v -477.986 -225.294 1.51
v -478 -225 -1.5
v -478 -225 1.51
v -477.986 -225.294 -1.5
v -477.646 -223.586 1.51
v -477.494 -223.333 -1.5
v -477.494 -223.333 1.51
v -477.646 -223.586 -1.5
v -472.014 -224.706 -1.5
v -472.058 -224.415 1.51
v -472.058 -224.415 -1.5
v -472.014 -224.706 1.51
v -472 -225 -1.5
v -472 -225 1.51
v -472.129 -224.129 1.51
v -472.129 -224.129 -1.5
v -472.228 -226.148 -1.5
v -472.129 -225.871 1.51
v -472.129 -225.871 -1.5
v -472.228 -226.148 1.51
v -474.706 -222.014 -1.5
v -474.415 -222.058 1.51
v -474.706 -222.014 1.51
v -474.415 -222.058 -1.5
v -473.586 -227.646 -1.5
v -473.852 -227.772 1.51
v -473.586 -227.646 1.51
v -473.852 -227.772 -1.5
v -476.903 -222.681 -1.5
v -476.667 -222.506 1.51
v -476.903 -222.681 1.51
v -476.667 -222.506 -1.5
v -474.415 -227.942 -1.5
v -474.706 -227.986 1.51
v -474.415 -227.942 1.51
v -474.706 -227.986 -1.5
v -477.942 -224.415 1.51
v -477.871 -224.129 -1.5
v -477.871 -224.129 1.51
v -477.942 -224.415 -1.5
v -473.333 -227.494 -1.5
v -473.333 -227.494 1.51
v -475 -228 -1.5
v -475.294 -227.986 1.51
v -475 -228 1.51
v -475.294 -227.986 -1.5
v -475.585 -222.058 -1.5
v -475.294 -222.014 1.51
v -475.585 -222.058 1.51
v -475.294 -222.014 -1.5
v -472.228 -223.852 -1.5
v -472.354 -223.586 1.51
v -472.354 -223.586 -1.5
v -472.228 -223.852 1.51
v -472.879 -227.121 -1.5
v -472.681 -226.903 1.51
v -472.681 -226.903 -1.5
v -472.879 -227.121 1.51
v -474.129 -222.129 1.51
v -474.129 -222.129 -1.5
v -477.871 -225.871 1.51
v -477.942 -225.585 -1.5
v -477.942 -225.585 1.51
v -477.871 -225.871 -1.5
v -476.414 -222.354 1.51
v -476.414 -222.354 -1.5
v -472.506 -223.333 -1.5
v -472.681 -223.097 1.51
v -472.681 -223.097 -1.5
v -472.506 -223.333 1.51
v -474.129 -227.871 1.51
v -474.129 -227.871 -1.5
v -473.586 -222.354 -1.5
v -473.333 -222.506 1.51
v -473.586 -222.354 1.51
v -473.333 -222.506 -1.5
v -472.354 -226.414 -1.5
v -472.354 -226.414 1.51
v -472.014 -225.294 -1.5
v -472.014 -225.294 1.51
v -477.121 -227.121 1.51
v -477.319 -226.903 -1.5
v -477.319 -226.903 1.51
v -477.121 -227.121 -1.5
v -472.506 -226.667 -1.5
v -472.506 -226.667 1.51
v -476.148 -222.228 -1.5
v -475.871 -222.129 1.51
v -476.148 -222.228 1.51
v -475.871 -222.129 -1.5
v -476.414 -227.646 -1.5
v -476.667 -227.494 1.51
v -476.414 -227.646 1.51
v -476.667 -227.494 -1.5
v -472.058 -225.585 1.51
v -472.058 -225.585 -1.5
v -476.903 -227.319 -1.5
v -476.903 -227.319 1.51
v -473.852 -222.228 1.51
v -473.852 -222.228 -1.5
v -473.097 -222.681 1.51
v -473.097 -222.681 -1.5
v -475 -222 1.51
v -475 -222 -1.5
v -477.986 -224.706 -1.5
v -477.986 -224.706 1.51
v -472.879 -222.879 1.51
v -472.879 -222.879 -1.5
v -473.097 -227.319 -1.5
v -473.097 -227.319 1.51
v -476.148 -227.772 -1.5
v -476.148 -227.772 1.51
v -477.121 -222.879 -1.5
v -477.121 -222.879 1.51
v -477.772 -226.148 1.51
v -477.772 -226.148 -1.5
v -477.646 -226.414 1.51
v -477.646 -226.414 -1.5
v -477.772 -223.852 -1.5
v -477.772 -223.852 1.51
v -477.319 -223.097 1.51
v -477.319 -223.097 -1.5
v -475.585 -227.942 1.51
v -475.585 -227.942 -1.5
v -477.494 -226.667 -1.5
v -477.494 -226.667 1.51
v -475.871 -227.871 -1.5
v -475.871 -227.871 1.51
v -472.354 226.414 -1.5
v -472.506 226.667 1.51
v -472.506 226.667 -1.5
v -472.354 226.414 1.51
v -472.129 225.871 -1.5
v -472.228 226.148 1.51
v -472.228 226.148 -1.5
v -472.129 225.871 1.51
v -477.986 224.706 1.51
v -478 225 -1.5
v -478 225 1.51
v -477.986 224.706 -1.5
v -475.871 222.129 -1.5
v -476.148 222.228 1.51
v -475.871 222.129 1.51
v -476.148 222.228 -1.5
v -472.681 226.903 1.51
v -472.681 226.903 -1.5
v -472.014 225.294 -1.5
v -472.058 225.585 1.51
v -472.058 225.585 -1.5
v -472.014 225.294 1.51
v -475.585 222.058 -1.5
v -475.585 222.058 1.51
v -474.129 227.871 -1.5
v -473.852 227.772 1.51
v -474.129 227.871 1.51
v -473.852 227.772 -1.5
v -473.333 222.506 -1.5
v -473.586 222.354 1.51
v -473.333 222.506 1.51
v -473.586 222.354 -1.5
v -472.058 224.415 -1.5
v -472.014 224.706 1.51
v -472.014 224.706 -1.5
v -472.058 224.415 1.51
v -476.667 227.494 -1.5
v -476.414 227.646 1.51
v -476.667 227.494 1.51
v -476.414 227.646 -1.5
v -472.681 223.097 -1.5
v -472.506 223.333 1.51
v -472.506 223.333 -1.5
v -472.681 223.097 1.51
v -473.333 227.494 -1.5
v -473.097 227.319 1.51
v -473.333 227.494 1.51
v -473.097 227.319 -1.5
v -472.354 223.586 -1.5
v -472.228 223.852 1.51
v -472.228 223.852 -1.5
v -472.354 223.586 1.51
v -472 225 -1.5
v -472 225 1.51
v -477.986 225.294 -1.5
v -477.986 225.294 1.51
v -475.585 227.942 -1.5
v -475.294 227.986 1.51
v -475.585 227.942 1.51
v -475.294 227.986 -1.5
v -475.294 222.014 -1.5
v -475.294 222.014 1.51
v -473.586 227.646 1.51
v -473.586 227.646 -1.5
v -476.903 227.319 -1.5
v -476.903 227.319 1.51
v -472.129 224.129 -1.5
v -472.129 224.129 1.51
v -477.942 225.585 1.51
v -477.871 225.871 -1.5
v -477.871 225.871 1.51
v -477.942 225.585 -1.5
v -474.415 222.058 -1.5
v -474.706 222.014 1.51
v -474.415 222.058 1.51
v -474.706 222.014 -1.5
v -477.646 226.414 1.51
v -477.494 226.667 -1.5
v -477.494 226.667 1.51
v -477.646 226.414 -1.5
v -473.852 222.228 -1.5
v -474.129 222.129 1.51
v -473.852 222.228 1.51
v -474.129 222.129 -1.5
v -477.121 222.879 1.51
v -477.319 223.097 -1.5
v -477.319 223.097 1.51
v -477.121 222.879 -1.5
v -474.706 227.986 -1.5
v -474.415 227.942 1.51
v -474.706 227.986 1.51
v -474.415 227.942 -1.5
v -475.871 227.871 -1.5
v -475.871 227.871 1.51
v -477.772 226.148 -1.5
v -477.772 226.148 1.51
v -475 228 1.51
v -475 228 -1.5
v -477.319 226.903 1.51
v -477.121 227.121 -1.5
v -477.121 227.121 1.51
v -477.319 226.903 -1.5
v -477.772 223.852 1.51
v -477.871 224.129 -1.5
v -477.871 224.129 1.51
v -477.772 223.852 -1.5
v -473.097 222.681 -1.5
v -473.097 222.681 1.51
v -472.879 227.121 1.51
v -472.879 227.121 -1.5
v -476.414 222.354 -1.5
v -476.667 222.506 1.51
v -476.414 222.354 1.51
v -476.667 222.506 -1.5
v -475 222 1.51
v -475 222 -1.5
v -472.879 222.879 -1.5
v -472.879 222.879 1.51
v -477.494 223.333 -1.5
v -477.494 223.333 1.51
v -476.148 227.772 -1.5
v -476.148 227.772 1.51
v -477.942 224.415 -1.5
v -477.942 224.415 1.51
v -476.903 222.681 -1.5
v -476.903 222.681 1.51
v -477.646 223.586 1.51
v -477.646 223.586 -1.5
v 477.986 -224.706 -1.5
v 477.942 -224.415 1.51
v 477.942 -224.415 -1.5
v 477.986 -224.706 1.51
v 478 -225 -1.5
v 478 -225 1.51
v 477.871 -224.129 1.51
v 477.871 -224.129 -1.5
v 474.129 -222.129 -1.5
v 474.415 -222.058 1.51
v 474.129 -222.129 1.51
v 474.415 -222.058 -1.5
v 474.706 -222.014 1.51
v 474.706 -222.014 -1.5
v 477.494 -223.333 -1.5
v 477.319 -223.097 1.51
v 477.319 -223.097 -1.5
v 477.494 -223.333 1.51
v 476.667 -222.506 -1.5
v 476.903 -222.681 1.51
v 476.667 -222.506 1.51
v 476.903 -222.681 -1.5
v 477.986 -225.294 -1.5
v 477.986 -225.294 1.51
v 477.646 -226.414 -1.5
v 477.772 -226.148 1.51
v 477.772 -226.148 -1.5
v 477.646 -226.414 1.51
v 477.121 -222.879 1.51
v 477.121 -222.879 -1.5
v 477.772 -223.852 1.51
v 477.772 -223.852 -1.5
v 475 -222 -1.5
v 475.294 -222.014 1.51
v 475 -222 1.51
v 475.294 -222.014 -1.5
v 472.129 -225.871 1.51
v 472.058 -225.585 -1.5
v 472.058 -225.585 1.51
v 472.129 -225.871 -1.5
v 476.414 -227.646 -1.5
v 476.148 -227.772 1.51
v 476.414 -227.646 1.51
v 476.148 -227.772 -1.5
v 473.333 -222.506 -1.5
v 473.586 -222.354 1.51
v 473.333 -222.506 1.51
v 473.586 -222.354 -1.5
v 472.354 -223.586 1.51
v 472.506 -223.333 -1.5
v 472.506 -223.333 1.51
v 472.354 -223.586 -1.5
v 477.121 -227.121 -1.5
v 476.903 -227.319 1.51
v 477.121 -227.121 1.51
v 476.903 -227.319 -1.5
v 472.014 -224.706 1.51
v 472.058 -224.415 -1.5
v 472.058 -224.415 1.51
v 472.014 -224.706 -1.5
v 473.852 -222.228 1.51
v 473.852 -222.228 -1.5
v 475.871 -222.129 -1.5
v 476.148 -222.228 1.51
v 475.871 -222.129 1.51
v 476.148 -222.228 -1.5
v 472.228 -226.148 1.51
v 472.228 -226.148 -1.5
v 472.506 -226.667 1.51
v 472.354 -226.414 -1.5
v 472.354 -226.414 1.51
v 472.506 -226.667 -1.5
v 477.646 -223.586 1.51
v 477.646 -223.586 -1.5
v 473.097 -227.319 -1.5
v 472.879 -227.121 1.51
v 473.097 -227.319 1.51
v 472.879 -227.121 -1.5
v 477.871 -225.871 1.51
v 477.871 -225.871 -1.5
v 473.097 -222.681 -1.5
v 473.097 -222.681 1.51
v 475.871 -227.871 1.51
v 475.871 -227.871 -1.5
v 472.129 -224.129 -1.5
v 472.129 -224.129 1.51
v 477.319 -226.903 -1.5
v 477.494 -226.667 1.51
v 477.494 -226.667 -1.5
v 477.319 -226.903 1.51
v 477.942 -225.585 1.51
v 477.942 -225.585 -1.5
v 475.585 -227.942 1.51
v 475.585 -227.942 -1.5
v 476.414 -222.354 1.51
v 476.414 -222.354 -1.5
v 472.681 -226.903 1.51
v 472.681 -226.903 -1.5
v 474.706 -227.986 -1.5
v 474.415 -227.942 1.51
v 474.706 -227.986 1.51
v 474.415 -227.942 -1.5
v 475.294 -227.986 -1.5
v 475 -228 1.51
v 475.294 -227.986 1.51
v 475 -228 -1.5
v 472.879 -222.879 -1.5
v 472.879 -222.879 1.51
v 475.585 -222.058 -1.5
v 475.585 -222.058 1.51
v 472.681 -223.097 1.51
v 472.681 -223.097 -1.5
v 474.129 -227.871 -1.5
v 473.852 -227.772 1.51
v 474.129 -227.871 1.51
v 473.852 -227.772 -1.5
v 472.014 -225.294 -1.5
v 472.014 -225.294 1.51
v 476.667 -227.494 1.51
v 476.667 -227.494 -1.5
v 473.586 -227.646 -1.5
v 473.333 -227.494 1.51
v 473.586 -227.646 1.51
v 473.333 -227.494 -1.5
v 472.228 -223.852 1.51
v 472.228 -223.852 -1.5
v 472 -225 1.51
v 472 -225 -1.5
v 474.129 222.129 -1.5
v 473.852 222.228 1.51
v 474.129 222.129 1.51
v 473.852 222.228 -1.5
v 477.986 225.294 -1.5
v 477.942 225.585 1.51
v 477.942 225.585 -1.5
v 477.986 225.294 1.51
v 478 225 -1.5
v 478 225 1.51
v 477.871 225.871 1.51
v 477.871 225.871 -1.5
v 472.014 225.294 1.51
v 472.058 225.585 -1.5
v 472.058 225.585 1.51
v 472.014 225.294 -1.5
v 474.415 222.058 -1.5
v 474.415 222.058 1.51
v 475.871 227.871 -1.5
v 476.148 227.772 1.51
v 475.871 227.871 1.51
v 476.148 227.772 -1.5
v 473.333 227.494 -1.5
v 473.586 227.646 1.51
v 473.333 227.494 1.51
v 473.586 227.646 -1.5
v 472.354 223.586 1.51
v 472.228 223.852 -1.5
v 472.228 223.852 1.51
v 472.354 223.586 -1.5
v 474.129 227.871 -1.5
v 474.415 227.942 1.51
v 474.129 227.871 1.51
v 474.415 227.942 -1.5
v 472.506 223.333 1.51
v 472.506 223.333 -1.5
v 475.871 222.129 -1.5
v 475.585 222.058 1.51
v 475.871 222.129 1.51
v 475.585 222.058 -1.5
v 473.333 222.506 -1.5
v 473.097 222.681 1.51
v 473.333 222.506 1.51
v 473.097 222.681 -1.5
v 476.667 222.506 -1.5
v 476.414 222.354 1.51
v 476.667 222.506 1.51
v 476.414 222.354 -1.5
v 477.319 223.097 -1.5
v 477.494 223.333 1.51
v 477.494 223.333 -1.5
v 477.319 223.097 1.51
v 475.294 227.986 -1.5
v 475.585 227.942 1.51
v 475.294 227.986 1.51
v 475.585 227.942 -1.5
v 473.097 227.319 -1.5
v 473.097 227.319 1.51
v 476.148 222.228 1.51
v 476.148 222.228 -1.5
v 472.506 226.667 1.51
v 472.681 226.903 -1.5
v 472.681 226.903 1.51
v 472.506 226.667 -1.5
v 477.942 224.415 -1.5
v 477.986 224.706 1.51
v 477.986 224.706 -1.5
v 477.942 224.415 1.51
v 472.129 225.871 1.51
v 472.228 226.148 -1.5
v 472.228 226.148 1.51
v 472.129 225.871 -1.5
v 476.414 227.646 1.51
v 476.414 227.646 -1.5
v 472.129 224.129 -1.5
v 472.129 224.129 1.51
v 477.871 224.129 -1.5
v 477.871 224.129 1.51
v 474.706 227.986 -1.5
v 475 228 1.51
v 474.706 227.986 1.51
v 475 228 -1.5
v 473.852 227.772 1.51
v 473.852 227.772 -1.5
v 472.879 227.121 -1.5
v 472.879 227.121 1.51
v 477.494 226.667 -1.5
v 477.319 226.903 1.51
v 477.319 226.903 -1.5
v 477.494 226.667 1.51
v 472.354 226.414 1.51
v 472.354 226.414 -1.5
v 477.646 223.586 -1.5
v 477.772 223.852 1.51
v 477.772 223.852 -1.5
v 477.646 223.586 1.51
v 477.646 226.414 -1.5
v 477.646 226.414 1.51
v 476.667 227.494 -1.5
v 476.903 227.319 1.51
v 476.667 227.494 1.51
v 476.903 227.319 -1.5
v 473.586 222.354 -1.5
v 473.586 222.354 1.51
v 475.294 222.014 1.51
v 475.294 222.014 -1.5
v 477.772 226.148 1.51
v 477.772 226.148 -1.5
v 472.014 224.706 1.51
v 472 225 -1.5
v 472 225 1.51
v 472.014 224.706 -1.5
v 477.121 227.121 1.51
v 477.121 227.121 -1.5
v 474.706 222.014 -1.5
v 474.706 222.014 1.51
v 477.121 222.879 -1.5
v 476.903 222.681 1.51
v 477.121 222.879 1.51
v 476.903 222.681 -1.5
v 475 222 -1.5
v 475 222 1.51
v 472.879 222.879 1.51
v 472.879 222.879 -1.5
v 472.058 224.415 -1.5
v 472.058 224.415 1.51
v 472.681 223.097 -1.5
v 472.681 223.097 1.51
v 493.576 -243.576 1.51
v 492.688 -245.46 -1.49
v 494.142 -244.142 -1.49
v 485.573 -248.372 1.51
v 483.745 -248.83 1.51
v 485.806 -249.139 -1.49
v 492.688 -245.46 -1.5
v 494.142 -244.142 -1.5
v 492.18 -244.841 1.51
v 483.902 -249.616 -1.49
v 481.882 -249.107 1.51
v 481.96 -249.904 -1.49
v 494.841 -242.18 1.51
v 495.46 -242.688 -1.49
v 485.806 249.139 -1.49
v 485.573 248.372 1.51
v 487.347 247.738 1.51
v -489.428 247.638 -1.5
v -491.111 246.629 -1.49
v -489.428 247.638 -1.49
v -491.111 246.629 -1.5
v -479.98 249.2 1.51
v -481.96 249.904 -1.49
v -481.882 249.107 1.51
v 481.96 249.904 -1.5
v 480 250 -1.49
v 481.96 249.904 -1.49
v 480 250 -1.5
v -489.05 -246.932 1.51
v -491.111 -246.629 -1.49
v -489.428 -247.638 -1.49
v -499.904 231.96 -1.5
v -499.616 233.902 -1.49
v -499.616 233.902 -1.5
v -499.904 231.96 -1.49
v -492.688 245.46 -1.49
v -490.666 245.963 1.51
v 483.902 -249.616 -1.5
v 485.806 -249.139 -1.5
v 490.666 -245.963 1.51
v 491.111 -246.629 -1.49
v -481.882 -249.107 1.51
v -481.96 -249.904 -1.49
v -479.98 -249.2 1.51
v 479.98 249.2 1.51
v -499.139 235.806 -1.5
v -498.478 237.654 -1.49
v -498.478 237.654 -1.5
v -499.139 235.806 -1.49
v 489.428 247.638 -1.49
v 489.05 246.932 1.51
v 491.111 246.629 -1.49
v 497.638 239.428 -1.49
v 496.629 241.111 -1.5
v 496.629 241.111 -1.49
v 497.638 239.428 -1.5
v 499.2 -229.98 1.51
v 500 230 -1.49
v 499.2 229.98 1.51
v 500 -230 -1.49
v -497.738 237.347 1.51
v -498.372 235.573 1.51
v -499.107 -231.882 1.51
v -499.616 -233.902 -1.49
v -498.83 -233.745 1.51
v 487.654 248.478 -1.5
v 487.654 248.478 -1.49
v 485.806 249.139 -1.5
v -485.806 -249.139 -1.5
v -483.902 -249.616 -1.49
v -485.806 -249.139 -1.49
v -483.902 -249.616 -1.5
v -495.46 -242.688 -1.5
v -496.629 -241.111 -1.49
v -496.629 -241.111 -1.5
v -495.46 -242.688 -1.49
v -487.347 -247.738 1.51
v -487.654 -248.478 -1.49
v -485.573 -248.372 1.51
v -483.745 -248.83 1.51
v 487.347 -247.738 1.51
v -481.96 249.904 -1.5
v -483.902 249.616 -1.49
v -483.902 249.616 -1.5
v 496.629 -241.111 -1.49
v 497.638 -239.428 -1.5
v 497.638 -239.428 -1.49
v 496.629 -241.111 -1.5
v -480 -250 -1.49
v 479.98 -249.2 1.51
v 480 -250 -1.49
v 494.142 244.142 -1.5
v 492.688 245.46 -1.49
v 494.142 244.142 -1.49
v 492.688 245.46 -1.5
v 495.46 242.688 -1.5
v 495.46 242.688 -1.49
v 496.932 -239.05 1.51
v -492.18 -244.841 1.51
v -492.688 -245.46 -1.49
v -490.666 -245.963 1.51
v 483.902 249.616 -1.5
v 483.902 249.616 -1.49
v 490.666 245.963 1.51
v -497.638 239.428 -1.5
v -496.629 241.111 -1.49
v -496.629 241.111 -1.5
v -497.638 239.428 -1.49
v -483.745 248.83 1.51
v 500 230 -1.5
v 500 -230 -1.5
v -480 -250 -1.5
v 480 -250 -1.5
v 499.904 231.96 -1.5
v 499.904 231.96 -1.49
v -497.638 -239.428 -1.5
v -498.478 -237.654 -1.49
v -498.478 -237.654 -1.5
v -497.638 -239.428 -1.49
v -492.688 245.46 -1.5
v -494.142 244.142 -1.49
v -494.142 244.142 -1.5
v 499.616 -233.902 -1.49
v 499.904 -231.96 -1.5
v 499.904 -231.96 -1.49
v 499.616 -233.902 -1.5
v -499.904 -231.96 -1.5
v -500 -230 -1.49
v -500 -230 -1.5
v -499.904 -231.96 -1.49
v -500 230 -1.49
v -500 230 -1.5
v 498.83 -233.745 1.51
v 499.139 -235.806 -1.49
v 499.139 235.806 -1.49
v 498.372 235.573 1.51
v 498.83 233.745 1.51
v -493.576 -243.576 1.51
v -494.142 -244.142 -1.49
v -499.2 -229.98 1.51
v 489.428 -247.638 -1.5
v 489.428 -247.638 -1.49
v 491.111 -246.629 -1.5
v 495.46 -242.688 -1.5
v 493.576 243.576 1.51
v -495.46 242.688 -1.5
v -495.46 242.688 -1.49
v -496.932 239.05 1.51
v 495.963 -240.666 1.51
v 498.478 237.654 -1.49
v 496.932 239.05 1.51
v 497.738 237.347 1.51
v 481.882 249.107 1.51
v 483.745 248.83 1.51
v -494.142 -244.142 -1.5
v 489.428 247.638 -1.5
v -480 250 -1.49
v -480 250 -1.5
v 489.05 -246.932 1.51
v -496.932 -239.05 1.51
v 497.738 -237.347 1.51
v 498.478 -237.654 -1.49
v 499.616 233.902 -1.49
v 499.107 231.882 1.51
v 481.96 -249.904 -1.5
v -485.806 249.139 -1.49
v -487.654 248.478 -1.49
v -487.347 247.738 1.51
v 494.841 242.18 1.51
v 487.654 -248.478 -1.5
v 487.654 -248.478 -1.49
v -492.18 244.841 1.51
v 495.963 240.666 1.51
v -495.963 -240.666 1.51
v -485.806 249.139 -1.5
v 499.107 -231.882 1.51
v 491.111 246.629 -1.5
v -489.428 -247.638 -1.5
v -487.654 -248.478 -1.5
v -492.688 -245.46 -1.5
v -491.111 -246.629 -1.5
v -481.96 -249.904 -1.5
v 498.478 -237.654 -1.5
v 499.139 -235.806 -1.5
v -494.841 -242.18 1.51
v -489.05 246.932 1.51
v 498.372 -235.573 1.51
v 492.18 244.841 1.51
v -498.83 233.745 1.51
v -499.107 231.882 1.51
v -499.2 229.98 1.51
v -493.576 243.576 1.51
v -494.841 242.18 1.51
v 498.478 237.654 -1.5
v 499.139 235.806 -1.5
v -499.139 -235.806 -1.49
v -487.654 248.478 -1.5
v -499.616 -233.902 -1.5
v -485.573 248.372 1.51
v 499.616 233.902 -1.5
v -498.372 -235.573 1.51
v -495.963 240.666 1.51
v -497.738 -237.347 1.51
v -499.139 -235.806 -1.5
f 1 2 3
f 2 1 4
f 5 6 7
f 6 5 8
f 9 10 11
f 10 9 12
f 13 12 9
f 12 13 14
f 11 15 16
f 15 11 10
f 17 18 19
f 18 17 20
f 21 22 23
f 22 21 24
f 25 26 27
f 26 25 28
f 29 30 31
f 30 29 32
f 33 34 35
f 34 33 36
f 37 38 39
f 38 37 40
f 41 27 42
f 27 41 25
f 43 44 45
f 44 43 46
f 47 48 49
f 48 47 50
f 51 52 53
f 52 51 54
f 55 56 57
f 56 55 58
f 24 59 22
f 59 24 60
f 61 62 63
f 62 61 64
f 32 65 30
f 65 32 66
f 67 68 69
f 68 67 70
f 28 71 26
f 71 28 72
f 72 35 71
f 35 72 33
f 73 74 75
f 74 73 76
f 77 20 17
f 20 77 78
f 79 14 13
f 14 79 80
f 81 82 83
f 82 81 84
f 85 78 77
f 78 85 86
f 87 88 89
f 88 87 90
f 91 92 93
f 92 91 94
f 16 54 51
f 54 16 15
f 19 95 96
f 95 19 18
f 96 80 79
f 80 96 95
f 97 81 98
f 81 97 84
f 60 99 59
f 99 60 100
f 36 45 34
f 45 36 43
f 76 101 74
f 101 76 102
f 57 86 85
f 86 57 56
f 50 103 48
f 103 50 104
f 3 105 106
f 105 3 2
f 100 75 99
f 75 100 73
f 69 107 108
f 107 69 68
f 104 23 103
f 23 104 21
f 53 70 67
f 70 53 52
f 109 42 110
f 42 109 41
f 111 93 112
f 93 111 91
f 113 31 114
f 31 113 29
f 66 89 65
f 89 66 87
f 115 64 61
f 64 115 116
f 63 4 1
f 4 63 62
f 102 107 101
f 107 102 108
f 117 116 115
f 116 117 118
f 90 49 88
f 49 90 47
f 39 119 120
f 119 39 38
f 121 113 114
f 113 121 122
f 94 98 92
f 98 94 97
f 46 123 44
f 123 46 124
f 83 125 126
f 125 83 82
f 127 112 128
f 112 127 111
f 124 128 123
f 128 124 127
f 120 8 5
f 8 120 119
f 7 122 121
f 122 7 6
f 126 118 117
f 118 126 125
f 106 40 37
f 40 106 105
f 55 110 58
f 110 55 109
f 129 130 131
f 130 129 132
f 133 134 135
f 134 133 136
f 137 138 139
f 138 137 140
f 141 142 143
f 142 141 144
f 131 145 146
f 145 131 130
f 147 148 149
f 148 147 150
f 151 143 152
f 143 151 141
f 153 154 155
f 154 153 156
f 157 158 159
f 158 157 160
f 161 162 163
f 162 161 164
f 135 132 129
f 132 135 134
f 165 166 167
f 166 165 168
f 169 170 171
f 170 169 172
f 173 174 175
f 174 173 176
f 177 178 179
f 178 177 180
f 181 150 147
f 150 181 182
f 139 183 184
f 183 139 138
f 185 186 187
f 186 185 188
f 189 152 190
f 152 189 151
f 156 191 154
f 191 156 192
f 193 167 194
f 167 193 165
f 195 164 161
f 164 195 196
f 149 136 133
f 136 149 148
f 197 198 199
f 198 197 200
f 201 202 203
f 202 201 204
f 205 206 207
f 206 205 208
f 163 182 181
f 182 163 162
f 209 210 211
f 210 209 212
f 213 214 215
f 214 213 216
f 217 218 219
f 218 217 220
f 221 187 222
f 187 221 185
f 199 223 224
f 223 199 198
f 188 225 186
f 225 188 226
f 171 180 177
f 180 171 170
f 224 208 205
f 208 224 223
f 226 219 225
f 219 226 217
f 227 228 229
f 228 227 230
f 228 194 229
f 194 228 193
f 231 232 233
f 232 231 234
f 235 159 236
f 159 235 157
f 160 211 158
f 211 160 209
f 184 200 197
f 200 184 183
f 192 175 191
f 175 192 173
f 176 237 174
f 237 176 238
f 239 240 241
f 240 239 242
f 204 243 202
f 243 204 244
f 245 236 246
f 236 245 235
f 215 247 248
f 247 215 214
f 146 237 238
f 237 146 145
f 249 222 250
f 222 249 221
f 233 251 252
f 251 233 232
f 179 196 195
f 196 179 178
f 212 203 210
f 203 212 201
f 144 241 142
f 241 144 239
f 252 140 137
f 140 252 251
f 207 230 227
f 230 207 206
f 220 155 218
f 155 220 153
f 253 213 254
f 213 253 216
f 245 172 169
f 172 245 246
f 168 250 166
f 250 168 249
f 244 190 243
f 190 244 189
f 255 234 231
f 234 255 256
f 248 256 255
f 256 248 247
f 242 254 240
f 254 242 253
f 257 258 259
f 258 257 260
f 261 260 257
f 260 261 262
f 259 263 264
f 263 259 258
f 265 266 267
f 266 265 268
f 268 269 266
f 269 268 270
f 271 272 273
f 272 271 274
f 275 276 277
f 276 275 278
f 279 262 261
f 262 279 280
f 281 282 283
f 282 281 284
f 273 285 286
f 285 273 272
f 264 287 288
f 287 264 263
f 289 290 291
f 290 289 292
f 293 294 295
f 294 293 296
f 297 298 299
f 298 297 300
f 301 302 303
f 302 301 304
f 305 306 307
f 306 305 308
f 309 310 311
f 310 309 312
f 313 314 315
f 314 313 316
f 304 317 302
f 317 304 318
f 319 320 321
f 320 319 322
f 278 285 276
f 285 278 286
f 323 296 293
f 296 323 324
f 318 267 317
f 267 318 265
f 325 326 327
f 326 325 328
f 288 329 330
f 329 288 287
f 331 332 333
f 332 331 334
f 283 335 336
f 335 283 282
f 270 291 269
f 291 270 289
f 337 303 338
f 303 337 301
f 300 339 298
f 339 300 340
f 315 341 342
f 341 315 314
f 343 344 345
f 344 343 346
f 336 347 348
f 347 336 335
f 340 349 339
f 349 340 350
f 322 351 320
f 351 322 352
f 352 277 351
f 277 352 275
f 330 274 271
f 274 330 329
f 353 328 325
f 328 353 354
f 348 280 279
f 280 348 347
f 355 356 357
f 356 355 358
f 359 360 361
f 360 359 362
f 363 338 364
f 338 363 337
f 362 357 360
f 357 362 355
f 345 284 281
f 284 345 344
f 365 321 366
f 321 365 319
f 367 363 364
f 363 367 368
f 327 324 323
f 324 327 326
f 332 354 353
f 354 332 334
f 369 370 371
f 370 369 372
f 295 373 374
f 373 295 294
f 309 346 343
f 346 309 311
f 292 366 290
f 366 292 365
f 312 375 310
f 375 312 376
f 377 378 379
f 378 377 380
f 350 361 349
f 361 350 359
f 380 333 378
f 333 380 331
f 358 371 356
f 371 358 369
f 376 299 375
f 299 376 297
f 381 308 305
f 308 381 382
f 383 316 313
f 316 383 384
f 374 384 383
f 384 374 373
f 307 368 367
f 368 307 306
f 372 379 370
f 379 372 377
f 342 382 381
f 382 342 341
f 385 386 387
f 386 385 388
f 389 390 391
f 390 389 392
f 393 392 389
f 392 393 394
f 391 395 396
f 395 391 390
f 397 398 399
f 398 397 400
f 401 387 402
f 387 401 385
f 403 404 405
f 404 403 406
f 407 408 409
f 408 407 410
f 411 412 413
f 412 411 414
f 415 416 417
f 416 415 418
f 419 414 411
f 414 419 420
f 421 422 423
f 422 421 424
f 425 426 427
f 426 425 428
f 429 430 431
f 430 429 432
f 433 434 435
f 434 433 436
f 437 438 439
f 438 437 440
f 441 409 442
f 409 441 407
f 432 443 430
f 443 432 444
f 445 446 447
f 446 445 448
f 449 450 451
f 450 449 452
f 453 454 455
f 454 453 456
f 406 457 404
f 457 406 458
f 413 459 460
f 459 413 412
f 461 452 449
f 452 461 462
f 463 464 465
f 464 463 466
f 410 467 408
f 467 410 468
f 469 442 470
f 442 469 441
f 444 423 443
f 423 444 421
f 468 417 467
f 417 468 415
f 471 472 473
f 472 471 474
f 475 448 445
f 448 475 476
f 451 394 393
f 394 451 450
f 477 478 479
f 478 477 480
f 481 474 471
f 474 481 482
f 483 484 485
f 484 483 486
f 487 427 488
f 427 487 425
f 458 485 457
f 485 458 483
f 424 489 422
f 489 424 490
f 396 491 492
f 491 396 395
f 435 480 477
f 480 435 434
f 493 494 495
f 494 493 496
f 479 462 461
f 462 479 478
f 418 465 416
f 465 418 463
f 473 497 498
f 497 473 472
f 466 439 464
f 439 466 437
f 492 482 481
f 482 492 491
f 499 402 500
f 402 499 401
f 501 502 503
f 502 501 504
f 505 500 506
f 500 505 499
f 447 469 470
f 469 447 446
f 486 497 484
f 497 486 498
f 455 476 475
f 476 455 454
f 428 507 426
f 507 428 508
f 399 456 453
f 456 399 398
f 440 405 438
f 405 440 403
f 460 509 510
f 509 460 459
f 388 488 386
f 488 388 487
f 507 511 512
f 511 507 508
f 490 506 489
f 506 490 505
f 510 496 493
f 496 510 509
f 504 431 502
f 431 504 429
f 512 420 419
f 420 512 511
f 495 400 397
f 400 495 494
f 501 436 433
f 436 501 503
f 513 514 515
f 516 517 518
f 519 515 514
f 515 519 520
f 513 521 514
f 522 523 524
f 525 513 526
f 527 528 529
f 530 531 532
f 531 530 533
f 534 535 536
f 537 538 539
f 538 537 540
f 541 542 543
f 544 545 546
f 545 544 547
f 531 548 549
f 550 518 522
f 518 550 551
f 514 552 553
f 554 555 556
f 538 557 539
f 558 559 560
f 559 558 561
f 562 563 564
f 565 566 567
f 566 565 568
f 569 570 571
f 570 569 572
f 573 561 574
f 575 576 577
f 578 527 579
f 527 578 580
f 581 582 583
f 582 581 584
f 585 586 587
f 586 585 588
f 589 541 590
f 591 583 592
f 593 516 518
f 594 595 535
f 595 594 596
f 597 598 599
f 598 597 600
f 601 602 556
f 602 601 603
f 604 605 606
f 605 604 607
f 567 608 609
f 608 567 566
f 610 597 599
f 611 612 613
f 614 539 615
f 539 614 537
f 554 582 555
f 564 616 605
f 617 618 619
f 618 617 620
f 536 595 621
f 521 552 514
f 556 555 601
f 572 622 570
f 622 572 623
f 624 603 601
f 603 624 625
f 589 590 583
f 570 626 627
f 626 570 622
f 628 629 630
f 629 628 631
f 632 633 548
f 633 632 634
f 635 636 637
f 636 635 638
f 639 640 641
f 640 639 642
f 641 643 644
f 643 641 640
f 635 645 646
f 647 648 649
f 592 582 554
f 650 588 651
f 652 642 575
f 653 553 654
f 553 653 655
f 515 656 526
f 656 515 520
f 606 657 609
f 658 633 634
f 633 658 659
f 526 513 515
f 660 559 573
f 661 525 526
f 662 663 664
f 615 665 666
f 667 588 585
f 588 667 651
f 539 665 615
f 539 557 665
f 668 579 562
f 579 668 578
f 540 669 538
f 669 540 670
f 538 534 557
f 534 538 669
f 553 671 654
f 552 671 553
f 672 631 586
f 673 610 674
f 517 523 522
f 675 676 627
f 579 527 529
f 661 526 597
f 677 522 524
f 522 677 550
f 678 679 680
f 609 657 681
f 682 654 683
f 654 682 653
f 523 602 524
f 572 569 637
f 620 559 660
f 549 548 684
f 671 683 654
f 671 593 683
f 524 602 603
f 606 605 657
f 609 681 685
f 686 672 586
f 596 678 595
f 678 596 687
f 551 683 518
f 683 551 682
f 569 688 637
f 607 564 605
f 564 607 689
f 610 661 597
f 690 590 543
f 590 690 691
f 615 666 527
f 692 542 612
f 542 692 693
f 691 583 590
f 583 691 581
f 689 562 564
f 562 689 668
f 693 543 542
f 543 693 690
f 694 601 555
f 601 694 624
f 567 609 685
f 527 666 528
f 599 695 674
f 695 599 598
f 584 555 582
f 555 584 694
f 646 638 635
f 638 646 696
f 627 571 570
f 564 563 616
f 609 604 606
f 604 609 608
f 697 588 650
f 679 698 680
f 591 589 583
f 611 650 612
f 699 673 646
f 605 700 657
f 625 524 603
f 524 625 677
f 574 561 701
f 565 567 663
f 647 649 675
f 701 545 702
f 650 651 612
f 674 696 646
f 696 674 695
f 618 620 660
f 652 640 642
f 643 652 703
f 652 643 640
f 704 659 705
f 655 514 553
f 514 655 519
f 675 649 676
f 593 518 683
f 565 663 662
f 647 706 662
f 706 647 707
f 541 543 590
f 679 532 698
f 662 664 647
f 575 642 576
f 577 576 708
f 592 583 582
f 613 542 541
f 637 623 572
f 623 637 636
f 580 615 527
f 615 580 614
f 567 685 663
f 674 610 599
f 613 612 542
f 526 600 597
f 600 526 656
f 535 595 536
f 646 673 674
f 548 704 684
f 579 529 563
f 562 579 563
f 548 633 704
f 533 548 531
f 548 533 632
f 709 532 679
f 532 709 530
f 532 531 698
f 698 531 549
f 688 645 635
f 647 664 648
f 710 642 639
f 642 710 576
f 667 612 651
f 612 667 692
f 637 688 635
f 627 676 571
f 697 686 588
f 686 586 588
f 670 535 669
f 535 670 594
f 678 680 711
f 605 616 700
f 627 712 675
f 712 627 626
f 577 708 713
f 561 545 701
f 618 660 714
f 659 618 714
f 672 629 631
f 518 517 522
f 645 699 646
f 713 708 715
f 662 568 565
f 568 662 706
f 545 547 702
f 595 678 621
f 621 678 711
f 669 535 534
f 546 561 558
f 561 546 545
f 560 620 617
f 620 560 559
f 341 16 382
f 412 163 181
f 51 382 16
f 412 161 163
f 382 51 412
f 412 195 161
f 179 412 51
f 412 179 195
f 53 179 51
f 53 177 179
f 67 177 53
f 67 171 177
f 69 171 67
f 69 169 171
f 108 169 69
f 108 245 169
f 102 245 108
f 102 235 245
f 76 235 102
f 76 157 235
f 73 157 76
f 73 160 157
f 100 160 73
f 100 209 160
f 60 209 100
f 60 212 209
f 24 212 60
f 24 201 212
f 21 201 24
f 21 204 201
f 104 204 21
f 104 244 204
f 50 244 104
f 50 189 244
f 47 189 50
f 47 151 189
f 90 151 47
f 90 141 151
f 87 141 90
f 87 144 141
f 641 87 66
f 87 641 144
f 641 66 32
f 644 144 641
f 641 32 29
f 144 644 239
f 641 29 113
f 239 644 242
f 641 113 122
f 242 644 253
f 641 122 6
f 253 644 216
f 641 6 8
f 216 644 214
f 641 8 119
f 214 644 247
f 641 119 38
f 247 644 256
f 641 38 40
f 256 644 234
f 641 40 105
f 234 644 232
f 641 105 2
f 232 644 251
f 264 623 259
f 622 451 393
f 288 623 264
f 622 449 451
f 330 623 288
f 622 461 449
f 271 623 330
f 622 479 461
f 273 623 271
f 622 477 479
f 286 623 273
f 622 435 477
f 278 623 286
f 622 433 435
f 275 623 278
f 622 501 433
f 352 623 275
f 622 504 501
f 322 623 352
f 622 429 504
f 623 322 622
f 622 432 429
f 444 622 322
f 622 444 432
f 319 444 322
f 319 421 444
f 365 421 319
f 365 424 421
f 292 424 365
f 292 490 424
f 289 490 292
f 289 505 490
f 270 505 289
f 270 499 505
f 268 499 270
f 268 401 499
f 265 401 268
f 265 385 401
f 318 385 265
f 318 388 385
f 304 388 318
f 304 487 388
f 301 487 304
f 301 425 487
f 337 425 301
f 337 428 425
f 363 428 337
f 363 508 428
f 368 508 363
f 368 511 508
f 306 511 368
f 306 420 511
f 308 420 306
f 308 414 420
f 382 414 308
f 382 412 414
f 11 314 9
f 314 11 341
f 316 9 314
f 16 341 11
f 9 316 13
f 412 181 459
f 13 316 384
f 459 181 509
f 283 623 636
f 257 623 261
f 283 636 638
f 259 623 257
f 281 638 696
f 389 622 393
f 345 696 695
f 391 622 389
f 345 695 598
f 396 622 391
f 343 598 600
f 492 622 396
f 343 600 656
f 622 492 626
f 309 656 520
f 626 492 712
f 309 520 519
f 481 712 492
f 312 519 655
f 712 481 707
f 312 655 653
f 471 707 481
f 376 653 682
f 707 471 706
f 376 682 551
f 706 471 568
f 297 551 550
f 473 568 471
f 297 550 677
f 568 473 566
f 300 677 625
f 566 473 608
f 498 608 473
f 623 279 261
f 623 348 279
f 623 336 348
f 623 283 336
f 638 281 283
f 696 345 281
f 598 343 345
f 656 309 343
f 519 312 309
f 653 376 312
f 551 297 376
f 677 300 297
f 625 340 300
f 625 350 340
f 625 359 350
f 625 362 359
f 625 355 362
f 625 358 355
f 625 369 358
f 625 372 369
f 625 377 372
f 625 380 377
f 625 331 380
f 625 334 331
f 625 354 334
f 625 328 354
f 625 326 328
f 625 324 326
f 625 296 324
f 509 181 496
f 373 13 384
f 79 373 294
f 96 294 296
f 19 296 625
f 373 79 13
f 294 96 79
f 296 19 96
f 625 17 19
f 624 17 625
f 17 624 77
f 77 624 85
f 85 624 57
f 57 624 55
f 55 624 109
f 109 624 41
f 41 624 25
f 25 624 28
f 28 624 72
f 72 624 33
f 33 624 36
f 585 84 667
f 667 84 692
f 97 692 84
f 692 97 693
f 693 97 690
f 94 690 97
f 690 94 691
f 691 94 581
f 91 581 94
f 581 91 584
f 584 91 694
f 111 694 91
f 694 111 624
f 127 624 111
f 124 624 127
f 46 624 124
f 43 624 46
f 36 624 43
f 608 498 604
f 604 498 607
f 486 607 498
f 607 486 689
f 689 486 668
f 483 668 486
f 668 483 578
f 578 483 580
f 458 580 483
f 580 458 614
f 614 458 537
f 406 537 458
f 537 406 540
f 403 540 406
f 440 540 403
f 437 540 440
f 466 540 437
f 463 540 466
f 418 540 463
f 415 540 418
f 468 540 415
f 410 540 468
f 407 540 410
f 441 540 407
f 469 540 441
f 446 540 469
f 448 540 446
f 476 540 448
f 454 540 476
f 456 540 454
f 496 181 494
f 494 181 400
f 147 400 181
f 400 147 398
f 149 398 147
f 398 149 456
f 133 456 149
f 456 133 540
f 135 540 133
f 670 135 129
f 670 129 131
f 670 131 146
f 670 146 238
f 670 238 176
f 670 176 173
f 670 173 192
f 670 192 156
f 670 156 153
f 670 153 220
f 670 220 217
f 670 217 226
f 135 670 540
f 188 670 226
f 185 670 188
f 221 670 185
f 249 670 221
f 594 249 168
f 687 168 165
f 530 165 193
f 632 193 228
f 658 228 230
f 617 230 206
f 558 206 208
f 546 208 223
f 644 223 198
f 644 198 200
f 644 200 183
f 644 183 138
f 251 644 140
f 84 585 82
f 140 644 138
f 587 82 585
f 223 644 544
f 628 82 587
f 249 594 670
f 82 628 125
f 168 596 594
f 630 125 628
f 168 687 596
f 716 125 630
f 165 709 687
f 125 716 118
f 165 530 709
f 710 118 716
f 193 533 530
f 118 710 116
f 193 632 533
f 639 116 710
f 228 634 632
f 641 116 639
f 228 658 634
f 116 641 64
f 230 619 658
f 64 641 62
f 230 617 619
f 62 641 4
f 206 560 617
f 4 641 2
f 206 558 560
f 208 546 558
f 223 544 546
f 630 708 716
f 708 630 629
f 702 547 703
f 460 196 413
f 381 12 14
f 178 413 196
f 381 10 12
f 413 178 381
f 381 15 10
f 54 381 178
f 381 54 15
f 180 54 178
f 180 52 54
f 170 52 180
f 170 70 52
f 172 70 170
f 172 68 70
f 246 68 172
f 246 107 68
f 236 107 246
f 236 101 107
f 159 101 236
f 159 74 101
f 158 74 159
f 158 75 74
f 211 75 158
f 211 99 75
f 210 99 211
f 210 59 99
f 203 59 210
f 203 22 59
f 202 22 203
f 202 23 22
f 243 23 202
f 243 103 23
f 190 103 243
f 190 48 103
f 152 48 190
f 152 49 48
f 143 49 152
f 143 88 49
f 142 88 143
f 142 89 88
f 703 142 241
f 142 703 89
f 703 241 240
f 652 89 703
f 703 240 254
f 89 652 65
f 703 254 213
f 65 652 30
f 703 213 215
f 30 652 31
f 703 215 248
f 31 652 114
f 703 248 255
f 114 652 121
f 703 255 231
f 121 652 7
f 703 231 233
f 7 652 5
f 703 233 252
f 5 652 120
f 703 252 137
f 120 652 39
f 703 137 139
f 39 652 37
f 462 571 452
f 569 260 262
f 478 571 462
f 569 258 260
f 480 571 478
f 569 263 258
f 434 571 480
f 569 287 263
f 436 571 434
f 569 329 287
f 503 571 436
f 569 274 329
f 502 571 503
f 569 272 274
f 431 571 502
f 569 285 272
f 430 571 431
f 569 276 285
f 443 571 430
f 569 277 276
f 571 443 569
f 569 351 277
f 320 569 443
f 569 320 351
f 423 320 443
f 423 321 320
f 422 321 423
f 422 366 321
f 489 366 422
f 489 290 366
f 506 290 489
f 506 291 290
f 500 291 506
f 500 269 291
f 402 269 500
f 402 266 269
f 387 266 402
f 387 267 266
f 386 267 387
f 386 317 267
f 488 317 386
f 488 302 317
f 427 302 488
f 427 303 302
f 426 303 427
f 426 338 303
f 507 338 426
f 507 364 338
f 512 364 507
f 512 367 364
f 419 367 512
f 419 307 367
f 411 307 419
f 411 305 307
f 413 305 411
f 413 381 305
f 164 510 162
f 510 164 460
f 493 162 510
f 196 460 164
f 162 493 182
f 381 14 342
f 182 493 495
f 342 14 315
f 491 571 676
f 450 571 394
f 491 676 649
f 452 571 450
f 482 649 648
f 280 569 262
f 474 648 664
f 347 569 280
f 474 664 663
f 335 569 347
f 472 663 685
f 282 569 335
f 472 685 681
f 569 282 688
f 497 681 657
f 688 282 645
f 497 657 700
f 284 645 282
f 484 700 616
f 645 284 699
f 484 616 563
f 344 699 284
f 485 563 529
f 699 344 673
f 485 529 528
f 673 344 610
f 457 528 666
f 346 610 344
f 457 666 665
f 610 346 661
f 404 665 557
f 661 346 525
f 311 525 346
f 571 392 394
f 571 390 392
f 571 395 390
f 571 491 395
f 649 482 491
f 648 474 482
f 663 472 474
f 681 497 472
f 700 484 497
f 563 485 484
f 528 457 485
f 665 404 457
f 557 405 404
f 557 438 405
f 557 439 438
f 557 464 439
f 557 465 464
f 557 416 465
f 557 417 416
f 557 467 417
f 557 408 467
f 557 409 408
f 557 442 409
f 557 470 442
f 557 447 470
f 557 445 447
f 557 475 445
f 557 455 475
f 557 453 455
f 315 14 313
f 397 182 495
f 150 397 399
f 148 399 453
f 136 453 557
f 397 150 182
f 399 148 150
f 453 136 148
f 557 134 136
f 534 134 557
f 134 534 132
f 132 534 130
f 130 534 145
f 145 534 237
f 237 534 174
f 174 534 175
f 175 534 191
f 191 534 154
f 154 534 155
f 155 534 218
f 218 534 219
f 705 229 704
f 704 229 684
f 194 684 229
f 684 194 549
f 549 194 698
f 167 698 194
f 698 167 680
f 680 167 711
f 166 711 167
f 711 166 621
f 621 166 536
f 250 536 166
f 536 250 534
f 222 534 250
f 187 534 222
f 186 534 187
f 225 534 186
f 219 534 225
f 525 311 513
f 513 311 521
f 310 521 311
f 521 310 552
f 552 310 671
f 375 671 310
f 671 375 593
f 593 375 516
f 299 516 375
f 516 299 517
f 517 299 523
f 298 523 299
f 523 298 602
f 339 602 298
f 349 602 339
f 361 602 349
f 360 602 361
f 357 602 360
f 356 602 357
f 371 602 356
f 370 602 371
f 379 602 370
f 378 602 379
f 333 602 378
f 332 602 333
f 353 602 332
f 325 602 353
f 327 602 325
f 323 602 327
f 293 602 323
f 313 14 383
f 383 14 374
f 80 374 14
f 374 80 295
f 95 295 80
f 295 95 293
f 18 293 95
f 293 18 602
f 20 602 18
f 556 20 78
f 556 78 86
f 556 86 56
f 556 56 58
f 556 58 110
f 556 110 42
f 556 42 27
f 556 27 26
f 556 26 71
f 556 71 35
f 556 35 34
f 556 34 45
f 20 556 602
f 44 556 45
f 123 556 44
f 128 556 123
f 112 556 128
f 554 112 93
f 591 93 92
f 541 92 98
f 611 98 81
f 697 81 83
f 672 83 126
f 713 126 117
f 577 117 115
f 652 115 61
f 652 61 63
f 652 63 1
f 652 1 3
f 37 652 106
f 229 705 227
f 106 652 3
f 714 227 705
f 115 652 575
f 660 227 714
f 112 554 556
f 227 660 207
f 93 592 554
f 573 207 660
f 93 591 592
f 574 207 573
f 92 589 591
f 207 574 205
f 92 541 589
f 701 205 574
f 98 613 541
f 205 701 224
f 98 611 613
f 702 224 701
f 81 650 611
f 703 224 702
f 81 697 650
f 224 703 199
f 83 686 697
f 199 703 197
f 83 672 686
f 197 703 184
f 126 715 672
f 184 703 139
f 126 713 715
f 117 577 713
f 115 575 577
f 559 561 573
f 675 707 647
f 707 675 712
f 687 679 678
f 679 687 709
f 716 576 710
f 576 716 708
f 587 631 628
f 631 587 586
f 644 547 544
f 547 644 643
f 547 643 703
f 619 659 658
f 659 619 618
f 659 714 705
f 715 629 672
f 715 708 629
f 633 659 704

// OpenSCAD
// Sheet DiBond (single connected solid)

// Parameters
sheet_length = 1000; //[500:2000:1]
sheet_width = 500;   //[250:1000:1]
sheet_thickness = 3; //[1.5:6:0.1]
corner_radius = 20;  //[5:60:1]
hole_diameter = 6;   //[3:12:0.5]
hole_edge_offset = 25; //[10:80:1]
edge_chamfer = 0.8;  //[0.2:2:0.1]

// Robustness / overlap
eps = 0.01;
overlap = 1; //[0.5:2:0.1]

// Derived checks (avoid invalid geometry)
cr = min(corner_radius, min(sheet_length, sheet_width)/2 - eps);
heo = min(hole_edge_offset, min(sheet_length, sheet_width)/2 - cr - eps);
ch = min(edge_chamfer, sheet_thickness/2 - eps);

// 2D rounded rectangle (exact, no floating corner cutters)
module rounded_rect_2d(L, W, R) {
    hull() {
        for (sx = [-1, 1], sy = [-1, 1])
            translate([sx*(L/2 - R), sy*(W/2 - R)])
                circle(r=R, $fn=64);
    }
}

// Final sheet: rounded corners + holes + edge chamfer, all connected
module dibond_sheet() {
    difference() {
        // Chamfered solid made by hulling top and bottom rounded rectangles
        hull() {
            translate([0, 0, -sheet_thickness/2])
                linear_extrude(height=eps)
                    rounded_rect_2d(sheet_length, sheet_width, cr);

            translate([0, 0,  sheet_thickness/2])
                linear_extrude(height=eps)
                    offset(delta=-ch)
                        rounded_rect_2d(sheet_length, sheet_width, cr);
        }

        // Mounting holes (through)
        for (sx = [-1, 1], sy = [-1, 1])
            translate([sx*(sheet_length/2 - heo), sy*(sheet_width/2 - heo), 0])
                cylinder(h=sheet_thickness + 2*overlap, r=hole_diameter/2, center=true, $fn=64);
    }
}

// Output
color([0.85, 0.85, 0.8])
dibond_sheet();
